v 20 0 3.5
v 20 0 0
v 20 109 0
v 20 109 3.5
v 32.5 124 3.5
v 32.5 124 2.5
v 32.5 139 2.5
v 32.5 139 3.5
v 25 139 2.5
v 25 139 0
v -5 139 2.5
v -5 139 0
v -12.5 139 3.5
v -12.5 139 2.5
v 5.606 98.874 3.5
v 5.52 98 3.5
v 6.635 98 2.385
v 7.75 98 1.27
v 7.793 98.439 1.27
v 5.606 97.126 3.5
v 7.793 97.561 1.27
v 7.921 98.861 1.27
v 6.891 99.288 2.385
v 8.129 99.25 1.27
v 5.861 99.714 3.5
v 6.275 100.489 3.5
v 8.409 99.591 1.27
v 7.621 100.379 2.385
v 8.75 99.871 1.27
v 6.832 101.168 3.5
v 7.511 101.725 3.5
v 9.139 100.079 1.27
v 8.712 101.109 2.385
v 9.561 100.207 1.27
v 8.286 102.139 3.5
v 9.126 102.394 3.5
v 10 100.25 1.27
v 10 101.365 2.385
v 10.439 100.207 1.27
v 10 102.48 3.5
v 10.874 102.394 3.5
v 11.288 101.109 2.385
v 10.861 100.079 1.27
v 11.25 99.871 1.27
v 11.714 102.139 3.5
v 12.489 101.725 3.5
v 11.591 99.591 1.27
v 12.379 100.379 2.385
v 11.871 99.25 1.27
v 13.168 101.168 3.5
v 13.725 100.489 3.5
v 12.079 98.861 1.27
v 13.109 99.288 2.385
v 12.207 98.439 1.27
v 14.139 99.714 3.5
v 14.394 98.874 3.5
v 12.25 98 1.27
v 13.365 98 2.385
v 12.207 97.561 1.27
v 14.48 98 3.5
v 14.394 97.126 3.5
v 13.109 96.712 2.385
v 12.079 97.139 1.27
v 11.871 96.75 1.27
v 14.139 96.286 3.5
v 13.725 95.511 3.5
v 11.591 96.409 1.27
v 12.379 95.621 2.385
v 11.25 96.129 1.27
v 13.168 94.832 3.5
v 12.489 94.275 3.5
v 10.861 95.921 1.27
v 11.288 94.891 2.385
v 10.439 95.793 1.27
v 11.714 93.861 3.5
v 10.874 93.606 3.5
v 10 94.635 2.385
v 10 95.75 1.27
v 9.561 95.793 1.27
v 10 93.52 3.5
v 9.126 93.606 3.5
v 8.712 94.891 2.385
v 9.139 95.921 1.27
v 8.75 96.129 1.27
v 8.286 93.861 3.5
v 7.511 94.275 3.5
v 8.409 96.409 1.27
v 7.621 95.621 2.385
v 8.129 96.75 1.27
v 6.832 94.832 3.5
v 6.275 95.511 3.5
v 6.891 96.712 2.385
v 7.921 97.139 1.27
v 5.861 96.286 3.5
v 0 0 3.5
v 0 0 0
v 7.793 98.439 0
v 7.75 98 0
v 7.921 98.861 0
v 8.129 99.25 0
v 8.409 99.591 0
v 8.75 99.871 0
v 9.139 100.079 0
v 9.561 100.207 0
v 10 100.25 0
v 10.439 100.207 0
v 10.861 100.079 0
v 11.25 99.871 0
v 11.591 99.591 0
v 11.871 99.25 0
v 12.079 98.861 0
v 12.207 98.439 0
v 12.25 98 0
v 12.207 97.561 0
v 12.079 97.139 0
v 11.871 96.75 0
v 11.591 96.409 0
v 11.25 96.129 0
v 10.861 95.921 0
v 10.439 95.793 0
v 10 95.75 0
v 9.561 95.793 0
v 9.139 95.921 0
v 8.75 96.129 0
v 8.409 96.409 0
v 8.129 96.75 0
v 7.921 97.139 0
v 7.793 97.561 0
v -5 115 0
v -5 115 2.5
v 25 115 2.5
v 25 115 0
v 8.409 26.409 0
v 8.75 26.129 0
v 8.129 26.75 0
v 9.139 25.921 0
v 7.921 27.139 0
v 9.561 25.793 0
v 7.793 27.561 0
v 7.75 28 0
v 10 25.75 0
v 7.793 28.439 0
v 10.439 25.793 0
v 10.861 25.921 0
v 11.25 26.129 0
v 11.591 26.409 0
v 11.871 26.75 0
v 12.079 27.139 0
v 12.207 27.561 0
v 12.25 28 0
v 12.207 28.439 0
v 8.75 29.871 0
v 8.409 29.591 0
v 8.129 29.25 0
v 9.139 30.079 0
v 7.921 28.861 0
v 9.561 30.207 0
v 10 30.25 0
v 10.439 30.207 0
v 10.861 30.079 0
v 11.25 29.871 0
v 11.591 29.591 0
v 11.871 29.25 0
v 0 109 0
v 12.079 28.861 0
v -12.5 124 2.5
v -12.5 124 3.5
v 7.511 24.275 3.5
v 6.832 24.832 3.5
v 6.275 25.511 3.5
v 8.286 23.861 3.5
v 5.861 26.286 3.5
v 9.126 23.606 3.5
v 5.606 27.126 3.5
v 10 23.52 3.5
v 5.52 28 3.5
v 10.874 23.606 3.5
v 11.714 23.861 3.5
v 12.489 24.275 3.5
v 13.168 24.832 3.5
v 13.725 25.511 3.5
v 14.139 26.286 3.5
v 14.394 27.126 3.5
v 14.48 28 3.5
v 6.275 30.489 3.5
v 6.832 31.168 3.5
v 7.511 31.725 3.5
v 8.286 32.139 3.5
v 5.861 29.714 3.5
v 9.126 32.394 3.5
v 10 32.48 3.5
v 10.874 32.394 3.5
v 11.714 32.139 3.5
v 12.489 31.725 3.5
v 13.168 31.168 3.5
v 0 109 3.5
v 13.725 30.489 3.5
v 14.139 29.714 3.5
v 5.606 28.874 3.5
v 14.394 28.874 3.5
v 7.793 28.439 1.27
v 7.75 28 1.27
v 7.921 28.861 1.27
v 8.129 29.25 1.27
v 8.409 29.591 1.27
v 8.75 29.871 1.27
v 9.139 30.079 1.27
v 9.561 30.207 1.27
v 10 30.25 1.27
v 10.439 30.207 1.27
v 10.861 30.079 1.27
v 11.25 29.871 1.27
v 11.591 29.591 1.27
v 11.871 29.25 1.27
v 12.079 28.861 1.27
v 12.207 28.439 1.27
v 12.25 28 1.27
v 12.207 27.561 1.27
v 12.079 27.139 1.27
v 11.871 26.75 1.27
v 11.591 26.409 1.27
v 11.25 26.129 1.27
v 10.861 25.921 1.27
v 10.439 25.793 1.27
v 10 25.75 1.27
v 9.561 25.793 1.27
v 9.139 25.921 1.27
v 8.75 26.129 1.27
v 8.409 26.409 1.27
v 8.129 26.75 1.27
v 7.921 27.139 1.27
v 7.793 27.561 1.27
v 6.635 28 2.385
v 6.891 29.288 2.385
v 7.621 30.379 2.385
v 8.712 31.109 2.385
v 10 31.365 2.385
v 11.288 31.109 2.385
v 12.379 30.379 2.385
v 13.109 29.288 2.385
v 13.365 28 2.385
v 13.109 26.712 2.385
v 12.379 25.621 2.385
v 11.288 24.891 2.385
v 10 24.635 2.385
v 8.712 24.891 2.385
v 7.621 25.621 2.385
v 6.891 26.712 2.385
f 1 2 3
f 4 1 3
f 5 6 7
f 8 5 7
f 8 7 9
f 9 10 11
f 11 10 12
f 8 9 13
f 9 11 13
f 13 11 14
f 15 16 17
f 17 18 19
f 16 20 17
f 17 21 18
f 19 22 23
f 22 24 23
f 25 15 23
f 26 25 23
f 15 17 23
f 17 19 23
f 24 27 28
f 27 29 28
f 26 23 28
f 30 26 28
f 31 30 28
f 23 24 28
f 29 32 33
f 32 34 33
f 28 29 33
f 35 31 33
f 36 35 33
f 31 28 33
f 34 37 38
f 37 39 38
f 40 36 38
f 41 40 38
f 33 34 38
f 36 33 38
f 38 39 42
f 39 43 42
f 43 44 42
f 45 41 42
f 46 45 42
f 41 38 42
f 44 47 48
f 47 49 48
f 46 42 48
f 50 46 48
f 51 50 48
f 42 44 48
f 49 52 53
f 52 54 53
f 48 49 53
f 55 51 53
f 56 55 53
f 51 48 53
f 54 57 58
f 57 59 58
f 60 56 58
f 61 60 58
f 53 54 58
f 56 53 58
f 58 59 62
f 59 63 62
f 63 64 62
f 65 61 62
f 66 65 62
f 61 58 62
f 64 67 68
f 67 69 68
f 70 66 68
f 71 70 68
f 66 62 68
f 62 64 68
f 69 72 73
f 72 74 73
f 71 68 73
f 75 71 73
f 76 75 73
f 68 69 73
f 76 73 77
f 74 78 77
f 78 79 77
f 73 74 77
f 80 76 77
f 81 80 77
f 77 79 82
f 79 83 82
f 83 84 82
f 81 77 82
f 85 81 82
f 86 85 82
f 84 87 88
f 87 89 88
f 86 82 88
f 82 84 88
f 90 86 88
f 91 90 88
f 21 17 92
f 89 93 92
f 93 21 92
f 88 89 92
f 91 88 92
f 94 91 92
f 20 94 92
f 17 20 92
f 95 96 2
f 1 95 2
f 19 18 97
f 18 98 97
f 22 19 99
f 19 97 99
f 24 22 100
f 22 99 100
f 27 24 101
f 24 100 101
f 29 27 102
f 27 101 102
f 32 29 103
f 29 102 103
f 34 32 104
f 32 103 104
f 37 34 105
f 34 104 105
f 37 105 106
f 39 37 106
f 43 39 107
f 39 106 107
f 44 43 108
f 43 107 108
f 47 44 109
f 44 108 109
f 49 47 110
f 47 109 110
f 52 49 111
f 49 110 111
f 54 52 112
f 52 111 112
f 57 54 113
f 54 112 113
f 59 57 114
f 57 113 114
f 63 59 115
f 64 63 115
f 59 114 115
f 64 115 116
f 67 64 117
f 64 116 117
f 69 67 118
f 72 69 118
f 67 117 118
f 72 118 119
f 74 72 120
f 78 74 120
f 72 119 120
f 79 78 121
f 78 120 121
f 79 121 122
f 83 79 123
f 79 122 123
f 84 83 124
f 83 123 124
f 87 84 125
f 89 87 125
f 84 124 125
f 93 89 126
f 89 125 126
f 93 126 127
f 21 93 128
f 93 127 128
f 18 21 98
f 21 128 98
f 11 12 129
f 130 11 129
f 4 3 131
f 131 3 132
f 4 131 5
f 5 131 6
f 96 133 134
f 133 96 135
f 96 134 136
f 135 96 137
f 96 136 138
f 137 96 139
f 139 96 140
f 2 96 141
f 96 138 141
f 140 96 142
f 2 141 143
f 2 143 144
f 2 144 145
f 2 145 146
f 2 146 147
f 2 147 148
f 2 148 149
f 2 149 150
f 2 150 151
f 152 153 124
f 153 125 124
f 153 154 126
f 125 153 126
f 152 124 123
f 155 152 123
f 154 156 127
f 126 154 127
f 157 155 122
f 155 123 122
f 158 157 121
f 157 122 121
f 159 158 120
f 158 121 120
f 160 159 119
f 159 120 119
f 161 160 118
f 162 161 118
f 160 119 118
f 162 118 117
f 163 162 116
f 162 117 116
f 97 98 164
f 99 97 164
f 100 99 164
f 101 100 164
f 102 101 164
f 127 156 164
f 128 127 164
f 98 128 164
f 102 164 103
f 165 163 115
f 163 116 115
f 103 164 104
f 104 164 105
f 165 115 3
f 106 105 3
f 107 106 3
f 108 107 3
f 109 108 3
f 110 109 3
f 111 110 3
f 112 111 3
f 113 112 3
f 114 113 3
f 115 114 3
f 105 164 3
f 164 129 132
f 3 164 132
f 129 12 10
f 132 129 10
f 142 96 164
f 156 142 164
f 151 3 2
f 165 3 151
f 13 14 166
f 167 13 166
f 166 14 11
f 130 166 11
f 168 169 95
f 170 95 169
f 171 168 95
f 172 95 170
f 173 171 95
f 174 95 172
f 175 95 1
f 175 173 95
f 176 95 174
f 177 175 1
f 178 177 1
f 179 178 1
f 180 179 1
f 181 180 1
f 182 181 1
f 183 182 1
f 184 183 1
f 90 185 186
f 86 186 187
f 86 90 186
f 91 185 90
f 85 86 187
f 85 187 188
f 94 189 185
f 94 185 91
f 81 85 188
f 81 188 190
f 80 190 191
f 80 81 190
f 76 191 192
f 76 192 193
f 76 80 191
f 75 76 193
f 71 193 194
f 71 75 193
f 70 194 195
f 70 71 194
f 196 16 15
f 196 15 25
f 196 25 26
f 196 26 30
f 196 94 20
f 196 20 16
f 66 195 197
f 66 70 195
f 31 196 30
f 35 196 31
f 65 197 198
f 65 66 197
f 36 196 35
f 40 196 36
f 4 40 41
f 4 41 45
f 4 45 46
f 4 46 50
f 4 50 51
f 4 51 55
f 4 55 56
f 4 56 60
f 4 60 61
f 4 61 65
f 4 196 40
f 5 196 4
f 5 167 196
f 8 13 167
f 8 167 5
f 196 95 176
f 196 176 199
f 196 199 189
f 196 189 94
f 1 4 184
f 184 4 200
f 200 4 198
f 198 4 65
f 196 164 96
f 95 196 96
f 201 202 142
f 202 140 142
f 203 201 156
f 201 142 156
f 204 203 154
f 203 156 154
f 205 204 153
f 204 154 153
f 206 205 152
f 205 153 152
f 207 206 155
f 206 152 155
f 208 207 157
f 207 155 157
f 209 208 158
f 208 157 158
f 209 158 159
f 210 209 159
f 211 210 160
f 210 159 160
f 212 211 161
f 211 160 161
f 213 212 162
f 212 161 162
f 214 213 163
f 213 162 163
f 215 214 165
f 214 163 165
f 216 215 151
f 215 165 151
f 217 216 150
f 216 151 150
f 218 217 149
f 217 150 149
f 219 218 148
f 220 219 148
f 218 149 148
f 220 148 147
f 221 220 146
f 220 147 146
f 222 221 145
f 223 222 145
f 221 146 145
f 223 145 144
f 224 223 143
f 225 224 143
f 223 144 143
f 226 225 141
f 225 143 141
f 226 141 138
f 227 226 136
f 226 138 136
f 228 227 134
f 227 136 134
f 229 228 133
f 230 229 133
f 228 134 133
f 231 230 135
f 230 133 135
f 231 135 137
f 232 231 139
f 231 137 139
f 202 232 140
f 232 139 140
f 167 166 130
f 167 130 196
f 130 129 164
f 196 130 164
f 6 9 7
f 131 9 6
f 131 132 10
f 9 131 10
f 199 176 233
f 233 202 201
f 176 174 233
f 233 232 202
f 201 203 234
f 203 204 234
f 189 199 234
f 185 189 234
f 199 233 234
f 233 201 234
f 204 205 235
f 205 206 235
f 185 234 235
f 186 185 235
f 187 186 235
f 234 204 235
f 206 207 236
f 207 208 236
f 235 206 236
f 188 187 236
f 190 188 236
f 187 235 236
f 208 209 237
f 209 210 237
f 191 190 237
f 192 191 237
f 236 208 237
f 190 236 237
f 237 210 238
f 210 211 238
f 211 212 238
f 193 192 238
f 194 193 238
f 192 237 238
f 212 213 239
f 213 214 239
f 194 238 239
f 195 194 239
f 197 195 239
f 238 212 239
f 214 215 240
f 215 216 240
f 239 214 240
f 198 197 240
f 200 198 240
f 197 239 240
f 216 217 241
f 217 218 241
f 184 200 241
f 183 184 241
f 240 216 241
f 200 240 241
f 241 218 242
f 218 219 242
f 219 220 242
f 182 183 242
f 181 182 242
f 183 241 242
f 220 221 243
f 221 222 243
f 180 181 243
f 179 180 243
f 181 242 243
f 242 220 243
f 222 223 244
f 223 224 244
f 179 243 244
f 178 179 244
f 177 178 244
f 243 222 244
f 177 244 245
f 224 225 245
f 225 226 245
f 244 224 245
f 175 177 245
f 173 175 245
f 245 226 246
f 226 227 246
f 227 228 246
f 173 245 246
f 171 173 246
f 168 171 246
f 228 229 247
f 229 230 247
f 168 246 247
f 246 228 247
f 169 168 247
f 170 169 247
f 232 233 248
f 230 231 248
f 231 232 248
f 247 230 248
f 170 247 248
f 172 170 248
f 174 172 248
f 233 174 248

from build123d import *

# Parameters (mm, degrees)
F1_DEPTH       = 3.5
F3_DEPTH       = 2.5
F5_D           = 4.5
F5_CSINK_D     = 8.96
F5_CSINK_ANGLE = 90


with BuildPart() as f1:
    # F0 (on Top) → F1 (new body)
    with BuildSketch(Plane.XY):
        Polygon((0, 109), (0, 0), (20, 0), (20, 109), (32.5, 124), (32.5, 139), (-12.5, 139), (-12.5, 124), align=None)
    extrude(amount=F1_DEPTH)

    # F2 (on face) → F3 (cut)
    with BuildSketch(Plane(origin=(0, 0, 0), x_dir=(1, 0, 0), z_dir=(0, 0, -1))):
        Polygon((-12.5, -124), (-12.5, -139), (-5, -139), (-5, -115), align=None)
        Polygon((25, -139), (32.5, -139), (32.5, -124), (25, -115), align=None)
    extrude(amount=-F3_DEPTH, mode=Mode.SUBTRACT)

    # F5 (through all)
    with Locations(Plane.XY.offset(3.5)):
        with Locations((10, 98), (10, 28)):
            CounterSinkHole(F5_D / 2, F5_CSINK_D / 2, counter_sink_angle=F5_CSINK_ANGLE)


solid = f1.part
